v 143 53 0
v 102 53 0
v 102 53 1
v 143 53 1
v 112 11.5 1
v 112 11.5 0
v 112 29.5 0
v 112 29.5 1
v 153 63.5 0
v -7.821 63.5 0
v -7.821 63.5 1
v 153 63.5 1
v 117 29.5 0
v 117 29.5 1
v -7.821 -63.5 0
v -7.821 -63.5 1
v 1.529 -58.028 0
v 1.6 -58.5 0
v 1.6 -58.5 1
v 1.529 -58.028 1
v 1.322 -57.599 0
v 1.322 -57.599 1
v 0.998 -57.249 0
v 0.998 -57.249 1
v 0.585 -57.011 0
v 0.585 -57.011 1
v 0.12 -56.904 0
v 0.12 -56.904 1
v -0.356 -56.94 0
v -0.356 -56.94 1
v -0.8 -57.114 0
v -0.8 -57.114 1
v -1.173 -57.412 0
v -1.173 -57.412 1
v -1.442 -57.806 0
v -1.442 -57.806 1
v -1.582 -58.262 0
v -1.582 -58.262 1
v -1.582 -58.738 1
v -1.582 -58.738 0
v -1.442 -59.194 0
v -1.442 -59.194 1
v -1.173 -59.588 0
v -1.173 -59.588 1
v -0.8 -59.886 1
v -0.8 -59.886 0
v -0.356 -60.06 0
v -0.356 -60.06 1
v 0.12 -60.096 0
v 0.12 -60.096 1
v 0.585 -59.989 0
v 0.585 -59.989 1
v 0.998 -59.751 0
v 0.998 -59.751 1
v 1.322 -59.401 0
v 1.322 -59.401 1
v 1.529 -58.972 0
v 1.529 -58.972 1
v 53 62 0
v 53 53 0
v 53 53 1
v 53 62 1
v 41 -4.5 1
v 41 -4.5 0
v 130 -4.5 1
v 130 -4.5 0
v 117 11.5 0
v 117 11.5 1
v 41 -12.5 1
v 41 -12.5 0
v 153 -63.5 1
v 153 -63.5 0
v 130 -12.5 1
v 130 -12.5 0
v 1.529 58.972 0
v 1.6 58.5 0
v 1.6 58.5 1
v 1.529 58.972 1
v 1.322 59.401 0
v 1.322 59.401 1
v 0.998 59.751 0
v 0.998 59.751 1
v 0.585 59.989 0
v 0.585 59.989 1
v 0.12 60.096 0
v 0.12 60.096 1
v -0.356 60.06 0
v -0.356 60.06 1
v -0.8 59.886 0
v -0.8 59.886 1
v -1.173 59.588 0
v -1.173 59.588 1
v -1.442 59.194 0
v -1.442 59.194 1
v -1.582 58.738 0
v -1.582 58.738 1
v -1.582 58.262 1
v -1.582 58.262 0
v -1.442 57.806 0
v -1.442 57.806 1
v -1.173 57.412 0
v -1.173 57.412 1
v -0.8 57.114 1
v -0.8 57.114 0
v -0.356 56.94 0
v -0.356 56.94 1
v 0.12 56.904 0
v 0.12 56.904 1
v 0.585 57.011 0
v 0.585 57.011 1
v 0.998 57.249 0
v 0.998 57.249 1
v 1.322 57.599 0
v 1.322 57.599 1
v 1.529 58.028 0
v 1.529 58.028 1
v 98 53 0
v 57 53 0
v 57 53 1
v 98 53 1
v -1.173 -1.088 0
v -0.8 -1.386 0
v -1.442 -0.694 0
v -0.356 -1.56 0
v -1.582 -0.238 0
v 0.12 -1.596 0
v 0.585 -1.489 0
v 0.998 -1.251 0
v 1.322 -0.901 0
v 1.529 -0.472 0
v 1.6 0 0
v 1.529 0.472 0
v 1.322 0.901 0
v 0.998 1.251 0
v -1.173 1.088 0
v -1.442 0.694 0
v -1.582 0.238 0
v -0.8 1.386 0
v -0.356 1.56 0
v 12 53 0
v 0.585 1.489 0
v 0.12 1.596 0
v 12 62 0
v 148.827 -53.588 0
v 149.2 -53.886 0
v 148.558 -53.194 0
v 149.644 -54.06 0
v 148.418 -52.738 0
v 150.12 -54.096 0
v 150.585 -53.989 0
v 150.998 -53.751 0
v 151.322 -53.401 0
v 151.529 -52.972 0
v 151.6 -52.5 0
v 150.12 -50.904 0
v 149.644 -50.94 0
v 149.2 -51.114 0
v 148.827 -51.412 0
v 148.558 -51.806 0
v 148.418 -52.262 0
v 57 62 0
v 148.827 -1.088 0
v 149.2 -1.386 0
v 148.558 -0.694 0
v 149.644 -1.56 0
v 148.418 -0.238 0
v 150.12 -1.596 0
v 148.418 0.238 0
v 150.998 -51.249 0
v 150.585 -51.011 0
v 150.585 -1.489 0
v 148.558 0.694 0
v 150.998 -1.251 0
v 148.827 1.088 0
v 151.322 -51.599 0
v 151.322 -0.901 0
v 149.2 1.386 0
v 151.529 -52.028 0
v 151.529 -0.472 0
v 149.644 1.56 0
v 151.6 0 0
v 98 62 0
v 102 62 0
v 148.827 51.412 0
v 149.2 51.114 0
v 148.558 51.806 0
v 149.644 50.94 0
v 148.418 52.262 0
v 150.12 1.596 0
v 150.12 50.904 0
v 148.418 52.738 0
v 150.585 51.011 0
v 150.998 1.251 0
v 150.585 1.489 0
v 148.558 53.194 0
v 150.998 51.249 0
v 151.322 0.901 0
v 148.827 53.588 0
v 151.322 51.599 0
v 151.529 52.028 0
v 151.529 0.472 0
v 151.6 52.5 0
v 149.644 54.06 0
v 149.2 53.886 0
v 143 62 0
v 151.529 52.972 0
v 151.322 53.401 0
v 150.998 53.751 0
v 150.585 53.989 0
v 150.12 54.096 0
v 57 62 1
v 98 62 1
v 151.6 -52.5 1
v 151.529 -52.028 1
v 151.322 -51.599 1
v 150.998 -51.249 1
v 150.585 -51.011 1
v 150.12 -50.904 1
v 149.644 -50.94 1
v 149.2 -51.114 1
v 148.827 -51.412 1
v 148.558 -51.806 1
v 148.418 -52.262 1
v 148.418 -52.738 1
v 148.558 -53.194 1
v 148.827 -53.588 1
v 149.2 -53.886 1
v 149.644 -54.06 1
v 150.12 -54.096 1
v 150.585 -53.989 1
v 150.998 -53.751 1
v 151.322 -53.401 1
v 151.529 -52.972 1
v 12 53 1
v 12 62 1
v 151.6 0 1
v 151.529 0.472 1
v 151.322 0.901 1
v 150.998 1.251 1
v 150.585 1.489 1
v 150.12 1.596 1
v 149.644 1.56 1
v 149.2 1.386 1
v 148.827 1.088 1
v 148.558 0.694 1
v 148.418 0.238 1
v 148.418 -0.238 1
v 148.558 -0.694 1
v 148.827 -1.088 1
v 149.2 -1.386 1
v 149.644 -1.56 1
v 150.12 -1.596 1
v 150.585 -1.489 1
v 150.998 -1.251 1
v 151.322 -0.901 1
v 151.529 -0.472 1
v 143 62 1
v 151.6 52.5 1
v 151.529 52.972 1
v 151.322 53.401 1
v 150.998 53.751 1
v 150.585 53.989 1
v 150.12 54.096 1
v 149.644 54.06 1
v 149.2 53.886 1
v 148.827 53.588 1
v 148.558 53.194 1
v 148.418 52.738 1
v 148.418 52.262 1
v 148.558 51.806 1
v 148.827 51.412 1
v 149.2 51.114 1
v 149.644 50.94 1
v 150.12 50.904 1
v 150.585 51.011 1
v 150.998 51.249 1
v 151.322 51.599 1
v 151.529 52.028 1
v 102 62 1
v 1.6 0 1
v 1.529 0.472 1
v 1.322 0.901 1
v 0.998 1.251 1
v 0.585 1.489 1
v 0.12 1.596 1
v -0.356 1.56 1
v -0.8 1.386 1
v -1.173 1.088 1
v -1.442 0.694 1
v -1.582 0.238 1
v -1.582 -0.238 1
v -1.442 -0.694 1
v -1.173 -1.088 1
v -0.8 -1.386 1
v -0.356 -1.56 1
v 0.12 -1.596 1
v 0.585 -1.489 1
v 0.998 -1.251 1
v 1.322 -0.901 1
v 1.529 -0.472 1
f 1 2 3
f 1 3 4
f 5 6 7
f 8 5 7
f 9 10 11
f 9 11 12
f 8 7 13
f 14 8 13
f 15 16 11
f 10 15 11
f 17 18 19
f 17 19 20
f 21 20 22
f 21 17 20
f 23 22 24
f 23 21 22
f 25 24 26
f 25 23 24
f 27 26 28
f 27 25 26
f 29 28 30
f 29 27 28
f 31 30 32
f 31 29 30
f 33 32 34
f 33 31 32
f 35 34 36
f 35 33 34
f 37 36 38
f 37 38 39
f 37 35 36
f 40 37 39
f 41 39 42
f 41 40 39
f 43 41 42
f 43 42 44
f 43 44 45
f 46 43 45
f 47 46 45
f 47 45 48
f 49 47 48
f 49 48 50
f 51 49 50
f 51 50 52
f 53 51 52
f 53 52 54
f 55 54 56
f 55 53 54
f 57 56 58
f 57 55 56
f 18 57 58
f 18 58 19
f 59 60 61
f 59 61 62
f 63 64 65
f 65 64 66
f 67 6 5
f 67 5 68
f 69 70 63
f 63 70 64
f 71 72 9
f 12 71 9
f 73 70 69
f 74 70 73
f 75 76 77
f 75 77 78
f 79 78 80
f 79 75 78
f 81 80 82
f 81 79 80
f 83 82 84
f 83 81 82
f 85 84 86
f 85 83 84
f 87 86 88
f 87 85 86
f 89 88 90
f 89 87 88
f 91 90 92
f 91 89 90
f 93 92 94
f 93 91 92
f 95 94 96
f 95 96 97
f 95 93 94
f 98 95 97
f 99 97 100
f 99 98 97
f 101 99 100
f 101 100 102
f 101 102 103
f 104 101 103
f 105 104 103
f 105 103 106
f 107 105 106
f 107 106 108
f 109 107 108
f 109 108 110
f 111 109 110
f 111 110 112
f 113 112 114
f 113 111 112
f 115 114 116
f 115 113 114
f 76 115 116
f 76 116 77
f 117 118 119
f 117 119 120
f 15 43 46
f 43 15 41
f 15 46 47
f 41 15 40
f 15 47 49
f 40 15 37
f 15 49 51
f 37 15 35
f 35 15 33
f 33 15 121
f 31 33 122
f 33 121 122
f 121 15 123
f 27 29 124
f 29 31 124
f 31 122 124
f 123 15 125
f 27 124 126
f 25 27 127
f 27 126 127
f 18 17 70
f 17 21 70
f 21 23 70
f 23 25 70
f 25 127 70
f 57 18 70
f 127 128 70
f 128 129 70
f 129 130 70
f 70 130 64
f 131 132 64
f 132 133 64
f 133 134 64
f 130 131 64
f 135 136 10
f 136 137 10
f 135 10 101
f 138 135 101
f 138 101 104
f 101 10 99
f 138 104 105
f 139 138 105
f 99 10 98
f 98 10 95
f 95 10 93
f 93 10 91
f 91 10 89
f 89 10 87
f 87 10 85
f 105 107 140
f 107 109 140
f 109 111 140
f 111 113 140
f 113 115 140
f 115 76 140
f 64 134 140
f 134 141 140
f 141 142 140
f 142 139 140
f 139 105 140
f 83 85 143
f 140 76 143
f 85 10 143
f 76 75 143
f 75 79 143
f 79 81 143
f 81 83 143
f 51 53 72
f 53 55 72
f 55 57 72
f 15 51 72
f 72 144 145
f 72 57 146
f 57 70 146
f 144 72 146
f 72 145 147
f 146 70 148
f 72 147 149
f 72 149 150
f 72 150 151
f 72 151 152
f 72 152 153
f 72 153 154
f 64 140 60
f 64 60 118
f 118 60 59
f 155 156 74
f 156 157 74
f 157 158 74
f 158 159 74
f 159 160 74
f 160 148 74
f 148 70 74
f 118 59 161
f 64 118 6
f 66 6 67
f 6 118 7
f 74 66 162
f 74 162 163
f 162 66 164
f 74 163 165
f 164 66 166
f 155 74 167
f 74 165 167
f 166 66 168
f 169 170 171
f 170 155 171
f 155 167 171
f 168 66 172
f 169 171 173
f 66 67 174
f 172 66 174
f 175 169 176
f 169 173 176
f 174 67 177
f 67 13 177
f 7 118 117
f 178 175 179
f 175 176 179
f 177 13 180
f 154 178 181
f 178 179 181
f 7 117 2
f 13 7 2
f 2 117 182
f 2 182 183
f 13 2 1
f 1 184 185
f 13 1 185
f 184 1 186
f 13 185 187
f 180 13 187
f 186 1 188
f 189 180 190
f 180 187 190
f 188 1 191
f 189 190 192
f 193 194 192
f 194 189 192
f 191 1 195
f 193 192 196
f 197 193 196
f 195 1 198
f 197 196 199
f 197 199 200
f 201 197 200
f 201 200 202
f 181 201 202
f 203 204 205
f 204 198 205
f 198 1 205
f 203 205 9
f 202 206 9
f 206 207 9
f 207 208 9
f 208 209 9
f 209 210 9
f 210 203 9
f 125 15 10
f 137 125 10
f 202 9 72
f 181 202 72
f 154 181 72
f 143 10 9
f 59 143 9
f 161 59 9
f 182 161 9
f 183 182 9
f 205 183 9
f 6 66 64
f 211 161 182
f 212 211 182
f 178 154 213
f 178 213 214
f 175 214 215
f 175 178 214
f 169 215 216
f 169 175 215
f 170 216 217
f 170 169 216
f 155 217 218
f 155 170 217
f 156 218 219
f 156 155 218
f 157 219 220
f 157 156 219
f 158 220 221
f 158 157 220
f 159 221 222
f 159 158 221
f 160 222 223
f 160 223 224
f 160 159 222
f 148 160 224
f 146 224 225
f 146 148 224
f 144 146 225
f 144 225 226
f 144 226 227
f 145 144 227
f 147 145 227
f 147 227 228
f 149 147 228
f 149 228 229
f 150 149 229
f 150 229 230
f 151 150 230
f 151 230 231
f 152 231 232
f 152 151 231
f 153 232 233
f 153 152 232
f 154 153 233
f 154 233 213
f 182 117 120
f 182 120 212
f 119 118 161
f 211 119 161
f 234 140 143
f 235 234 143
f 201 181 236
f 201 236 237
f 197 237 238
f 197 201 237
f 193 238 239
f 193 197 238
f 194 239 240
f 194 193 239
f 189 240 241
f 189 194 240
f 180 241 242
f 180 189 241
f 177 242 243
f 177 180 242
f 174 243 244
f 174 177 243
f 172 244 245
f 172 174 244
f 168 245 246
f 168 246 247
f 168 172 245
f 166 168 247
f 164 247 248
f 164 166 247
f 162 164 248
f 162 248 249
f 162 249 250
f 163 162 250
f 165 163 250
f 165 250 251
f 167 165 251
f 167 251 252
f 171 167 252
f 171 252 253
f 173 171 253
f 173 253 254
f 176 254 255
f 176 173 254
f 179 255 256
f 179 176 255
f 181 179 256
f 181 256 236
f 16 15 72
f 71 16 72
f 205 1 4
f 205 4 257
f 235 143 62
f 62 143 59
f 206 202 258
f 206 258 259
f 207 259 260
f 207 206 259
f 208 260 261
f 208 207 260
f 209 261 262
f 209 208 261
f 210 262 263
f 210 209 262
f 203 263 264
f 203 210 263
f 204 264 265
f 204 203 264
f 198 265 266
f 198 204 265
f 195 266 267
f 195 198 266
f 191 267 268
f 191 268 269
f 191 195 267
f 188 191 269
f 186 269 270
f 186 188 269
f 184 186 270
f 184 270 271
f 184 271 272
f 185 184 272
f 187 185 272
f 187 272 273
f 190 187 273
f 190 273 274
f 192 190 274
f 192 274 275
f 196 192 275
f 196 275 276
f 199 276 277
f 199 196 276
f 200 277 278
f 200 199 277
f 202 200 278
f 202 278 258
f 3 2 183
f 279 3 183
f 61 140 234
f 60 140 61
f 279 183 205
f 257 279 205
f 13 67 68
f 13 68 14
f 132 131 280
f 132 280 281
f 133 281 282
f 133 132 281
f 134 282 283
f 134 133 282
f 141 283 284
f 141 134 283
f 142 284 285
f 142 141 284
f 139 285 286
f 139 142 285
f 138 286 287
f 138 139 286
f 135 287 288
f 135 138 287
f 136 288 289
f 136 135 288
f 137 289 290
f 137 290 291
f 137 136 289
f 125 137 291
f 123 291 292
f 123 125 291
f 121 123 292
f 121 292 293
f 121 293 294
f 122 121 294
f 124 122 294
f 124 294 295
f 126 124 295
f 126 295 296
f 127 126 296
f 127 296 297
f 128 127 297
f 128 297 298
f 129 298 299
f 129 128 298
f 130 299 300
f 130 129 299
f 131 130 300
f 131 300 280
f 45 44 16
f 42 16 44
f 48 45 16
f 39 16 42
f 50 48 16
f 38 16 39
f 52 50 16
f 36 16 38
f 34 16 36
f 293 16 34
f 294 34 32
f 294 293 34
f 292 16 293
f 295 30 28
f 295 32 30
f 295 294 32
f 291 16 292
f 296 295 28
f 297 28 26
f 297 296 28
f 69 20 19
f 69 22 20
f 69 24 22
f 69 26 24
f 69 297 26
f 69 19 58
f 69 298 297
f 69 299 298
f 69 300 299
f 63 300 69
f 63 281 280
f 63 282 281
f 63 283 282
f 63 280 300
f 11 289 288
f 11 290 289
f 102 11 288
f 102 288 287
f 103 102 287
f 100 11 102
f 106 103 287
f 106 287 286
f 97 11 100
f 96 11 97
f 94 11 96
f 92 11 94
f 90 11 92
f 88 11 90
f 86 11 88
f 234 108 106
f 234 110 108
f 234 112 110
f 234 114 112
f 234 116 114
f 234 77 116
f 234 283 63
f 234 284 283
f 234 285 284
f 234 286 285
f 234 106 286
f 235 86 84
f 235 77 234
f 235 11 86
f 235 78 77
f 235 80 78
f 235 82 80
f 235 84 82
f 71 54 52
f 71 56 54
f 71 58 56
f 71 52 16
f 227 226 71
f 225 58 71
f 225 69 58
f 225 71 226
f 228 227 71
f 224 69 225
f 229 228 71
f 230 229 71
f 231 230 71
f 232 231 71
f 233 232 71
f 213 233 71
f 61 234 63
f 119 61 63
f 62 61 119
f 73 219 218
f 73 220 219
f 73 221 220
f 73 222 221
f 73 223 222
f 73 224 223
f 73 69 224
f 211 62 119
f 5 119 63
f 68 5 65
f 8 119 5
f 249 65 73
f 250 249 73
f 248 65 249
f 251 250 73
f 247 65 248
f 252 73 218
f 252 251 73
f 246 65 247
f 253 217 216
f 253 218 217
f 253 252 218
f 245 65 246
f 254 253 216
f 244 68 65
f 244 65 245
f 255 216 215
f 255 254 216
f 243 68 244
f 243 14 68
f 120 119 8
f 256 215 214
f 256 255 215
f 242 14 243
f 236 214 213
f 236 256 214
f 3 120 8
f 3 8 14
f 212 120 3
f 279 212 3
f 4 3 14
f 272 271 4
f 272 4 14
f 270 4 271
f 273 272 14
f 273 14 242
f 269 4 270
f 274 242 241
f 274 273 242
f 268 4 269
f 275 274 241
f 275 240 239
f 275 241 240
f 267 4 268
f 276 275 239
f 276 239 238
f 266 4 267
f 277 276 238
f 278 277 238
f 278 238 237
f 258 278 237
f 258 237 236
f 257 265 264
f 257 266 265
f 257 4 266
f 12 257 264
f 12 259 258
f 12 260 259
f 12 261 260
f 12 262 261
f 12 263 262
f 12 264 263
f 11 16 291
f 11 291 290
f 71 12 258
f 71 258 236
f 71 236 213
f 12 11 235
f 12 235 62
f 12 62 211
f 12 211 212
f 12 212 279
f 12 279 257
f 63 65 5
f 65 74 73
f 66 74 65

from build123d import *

# Parameters (mm, degrees)
F0_W     = 306
F0_H     = 127
F0_R     = 1.6
F0_W_2   = 89
F0_H_2   = 8
F0_W_3   = 11
F0_H_3   = 35
F0_W_4   = 54
F0_H_4   = 14
F0_W_5   = 32
F0_W_6   = 16.6
F0_H_5   = 17.1
F0_W_7   = 5
F0_H_6   = 18
F0_W_8   = 41
F0_H_7   = 9
F1_DEPTH = 1
F2_W     = 148.235004
F2_H     = 139.296211
F3_DEPTH = 12.5


with BuildPart() as f1:
    # F0 (on Top) → F1 (new body)
    with BuildSketch(Plane.XY):
        Rectangle(F0_W, F0_H)
        with Locations((-150, -52.5)):
            Circle(F0_R, mode=Mode.SUBTRACT)
        with Locations((0, -58.5)):
            Circle(F0_R, mode=Mode.SUBTRACT)
        with Locations((150, -52.5)):
            Circle(F0_R, mode=Mode.SUBTRACT)
        with Locations((85.5, -8.5)):
            Rectangle(F0_W_2, F0_H_2, mode=Mode.SUBTRACT)
        with Locations((-150, 0)):
            Circle(F0_R, mode=Mode.SUBTRACT)
        with Locations((-140, 25.5)):
            Rectangle(F0_W_3, F0_H_3, mode=Mode.SUBTRACT)
        with Locations((-150, 52.5)):
            Circle(F0_R, mode=Mode.SUBTRACT)
        with Locations((-119, 55)):
            Rectangle(F0_W_4, F0_H_4, mode=Mode.SUBTRACT)
        with Locations((-75, 55)):
            Rectangle(F0_W_5, F0_H_4, mode=Mode.SUBTRACT)
        with Locations((-19.5, 52.65)):
            Rectangle(F0_W_6, F0_H_5, mode=Mode.SUBTRACT)
        Circle(F0_R, mode=Mode.SUBTRACT)
        with Locations((150, 0)):
            Circle(F0_R, mode=Mode.SUBTRACT)
        with Locations((114.5, 20.5)):
            Rectangle(F0_W_7, F0_H_6, mode=Mode.SUBTRACT)
        with Locations((0, 58.5)):
            Circle(F0_R, mode=Mode.SUBTRACT)
        with Locations((32.5, 57.5)):
            Rectangle(F0_W_8, F0_H_7, mode=Mode.SUBTRACT)
        with Locations((77.5, 57.5)):
            Rectangle(F0_W_8, F0_H_7, mode=Mode.SUBTRACT)
        with Locations((150, 52.5)):
            Circle(F0_R, mode=Mode.SUBTRACT)
        with Locations((122.5, 57.5)):
            Rectangle(F0_W_8, F0_H_7, mode=Mode.SUBTRACT)
    extrude(amount=F1_DEPTH)

    # F2 (on Top) → F3 (cut, symmetric)
    with BuildSketch(Plane.XY):
        with Locations((-81.938947, 0.248301)):
            Rectangle(F2_W, F2_H)
    extrude(amount=F3_DEPTH, both=True, mode=Mode.SUBTRACT)


solid = f1.part
